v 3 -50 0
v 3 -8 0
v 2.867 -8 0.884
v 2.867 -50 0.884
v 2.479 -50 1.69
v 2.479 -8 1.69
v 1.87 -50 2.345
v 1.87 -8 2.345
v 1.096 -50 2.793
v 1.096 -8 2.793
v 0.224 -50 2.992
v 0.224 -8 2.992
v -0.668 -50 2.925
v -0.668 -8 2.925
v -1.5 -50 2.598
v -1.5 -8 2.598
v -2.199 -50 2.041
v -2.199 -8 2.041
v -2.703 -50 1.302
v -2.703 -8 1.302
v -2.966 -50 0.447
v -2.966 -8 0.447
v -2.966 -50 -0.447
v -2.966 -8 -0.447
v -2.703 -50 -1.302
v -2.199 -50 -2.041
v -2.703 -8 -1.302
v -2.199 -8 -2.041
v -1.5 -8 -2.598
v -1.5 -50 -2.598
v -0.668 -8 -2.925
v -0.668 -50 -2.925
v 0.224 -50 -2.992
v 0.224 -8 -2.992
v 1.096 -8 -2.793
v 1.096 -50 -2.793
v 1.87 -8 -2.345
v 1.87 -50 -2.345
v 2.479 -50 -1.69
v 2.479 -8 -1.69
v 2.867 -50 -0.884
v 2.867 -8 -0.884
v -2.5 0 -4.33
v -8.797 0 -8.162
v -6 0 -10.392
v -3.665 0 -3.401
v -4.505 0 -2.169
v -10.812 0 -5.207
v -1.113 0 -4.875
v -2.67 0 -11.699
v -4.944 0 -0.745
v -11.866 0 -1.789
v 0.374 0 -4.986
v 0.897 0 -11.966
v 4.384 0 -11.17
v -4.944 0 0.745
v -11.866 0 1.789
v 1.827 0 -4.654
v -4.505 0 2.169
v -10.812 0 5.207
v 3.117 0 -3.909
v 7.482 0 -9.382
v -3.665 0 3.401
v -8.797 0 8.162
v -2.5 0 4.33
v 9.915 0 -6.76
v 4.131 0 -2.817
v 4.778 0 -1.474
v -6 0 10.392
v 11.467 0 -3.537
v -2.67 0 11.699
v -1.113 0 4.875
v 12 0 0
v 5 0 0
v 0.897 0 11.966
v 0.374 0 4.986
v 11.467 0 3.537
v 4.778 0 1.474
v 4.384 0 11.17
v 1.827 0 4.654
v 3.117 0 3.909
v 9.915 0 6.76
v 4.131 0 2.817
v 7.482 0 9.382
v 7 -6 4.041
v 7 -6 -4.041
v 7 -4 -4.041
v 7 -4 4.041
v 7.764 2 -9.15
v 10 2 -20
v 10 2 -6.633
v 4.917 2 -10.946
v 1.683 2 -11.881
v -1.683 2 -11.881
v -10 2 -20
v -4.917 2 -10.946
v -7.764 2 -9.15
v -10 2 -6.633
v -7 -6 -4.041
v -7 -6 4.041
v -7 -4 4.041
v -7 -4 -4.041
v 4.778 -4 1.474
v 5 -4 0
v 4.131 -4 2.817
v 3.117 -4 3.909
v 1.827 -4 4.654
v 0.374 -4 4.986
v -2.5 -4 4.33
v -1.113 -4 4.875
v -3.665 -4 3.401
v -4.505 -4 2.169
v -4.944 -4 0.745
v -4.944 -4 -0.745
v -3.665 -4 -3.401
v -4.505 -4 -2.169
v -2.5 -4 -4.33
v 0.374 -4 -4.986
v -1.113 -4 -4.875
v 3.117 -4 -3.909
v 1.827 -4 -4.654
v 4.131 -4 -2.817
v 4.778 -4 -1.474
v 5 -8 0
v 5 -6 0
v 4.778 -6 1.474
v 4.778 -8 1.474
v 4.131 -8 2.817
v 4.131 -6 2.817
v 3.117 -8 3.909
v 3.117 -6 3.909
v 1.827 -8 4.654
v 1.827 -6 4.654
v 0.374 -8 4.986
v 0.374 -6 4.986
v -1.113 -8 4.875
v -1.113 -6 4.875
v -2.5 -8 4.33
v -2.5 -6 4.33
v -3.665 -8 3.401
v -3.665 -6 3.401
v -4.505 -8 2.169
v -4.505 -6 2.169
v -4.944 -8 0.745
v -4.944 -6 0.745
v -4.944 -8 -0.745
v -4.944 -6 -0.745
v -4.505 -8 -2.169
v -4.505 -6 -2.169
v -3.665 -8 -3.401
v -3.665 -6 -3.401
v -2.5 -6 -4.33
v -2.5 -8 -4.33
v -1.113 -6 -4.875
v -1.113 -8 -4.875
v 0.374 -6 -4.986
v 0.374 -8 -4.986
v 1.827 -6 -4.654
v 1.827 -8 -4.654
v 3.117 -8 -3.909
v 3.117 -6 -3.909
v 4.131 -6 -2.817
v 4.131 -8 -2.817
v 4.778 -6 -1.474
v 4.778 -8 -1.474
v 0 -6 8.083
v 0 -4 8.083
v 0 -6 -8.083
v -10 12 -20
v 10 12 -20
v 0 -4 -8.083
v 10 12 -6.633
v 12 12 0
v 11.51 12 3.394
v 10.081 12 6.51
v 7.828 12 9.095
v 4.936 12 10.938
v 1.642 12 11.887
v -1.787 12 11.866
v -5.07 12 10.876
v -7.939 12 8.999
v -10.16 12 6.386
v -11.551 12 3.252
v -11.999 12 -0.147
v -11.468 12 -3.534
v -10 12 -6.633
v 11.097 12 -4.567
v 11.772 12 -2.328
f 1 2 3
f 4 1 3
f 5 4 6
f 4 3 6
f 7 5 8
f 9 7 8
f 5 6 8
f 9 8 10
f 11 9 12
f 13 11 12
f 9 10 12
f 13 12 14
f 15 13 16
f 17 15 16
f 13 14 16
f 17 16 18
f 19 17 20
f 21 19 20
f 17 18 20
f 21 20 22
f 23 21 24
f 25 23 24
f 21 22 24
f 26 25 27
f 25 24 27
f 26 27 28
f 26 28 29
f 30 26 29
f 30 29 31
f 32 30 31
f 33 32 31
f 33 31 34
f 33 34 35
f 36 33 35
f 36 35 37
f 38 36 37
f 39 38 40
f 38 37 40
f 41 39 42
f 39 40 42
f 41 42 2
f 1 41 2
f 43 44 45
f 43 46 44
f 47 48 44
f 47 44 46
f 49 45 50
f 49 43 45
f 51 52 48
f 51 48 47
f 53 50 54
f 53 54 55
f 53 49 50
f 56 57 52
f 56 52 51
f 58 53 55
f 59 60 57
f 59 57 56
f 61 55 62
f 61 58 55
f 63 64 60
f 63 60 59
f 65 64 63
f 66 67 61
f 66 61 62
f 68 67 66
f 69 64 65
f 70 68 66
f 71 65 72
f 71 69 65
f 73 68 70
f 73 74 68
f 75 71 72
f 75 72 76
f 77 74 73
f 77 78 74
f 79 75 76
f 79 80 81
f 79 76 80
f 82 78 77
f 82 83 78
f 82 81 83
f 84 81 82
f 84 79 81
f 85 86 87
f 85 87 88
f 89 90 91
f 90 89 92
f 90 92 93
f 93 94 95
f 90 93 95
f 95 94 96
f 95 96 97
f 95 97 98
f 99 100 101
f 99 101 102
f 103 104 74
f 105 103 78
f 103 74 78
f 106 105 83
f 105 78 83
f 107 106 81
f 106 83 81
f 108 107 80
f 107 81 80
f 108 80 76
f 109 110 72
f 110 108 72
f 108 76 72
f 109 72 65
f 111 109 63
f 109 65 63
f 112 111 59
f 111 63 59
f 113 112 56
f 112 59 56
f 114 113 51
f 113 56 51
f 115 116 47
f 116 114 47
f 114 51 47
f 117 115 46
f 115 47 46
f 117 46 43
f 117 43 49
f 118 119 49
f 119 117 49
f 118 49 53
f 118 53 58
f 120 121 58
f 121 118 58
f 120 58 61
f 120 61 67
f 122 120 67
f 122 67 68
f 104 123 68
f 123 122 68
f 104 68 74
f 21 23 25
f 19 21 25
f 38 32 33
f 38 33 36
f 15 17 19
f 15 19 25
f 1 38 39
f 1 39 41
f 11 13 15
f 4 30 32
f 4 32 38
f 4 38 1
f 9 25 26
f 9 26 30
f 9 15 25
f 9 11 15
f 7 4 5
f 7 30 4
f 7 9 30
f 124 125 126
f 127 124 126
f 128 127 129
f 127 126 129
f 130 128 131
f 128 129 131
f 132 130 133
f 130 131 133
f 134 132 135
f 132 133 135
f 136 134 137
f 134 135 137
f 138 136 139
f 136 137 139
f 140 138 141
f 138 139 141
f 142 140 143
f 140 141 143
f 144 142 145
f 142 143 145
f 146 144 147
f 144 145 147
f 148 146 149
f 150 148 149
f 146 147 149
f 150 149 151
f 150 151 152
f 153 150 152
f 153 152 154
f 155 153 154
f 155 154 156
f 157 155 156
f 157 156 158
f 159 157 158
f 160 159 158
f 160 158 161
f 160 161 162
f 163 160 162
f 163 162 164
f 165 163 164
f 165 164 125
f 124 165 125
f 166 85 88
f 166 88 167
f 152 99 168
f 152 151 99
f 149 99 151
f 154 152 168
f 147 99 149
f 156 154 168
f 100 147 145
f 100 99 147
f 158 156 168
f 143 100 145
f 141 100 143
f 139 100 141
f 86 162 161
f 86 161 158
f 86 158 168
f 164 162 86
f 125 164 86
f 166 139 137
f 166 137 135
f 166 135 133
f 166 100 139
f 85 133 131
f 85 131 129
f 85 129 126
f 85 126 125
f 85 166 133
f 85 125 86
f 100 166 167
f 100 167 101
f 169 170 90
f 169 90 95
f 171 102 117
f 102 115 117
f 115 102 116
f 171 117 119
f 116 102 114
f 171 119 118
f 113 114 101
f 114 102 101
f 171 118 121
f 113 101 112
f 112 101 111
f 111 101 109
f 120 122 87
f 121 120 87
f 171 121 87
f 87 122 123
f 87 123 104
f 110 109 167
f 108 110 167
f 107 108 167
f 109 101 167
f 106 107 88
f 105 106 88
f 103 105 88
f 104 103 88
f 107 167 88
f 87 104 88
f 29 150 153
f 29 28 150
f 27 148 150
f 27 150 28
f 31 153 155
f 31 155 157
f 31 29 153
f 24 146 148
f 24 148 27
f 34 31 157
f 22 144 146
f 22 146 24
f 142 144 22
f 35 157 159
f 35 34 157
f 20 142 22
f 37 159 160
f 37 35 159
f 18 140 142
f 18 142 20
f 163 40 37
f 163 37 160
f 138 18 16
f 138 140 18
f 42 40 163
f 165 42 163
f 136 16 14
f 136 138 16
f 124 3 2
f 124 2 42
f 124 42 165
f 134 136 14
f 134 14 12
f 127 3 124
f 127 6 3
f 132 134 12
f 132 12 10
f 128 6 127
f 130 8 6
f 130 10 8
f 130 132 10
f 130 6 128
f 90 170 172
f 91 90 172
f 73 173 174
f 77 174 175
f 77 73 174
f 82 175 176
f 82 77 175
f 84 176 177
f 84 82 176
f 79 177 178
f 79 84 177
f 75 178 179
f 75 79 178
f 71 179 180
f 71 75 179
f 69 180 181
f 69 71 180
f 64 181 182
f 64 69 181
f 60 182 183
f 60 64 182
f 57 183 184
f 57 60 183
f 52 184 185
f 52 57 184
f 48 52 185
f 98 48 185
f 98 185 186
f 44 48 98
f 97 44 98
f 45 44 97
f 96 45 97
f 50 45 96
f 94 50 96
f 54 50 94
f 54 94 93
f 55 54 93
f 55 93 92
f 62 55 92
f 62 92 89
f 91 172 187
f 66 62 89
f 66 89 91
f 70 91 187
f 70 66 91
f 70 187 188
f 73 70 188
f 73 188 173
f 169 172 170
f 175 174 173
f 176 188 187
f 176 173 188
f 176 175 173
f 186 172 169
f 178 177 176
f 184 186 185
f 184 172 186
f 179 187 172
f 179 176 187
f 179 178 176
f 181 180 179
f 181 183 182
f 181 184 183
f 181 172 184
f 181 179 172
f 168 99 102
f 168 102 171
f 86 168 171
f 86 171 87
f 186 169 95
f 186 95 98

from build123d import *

# Parameters (mm, degrees)
F0_R      = 5
F1_DEPTH  = 8
F2_R      = 3
F3_DEPTH  = 42
F4_R      = 12
F5_DEPTH  = 12
F6_W      = 20
F6_H      = 20
F7_DEPTH  = 10
F10_DEPTH = 2


with BuildPart() as f1:
    # F0 (on Front) → F1 (new body)
    with BuildSketch(Plane.XZ):
        Circle(F0_R)
    extrude(amount=F1_DEPTH)

    # F2 (on face) → F3 (join)
    with BuildSketch(Plane.XZ.offset(8)):
        Circle(F2_R)
    extrude(amount=F3_DEPTH)

    # F4 (on Front) → F5 (join)
    with BuildSketch(Plane.XZ):
        Circle(F4_R)
    extrude(amount=-F5_DEPTH)

    # F6 (on face) → F7 (join)
    with BuildSketch(Plane(origin=(0, 12, 0), x_dir=(-1, 0, 0), z_dir=(0, 1, 0))):
        with Locations((0, -10)):
            Rectangle(F6_W, F6_H)
    extrude(amount=-F7_DEPTH)

    # F9 (on offset) → F10 (join)
    with BuildSketch(Plane.XZ.offset(6)):
        Polygon((7, -4.041452), (7, 4.041452), (0, 8.082904), (-7, 4.041452), (-7, -4.041452), (0, -8.082904), align=None)
    extrude(amount=-F10_DEPTH)


solid = f1.part
